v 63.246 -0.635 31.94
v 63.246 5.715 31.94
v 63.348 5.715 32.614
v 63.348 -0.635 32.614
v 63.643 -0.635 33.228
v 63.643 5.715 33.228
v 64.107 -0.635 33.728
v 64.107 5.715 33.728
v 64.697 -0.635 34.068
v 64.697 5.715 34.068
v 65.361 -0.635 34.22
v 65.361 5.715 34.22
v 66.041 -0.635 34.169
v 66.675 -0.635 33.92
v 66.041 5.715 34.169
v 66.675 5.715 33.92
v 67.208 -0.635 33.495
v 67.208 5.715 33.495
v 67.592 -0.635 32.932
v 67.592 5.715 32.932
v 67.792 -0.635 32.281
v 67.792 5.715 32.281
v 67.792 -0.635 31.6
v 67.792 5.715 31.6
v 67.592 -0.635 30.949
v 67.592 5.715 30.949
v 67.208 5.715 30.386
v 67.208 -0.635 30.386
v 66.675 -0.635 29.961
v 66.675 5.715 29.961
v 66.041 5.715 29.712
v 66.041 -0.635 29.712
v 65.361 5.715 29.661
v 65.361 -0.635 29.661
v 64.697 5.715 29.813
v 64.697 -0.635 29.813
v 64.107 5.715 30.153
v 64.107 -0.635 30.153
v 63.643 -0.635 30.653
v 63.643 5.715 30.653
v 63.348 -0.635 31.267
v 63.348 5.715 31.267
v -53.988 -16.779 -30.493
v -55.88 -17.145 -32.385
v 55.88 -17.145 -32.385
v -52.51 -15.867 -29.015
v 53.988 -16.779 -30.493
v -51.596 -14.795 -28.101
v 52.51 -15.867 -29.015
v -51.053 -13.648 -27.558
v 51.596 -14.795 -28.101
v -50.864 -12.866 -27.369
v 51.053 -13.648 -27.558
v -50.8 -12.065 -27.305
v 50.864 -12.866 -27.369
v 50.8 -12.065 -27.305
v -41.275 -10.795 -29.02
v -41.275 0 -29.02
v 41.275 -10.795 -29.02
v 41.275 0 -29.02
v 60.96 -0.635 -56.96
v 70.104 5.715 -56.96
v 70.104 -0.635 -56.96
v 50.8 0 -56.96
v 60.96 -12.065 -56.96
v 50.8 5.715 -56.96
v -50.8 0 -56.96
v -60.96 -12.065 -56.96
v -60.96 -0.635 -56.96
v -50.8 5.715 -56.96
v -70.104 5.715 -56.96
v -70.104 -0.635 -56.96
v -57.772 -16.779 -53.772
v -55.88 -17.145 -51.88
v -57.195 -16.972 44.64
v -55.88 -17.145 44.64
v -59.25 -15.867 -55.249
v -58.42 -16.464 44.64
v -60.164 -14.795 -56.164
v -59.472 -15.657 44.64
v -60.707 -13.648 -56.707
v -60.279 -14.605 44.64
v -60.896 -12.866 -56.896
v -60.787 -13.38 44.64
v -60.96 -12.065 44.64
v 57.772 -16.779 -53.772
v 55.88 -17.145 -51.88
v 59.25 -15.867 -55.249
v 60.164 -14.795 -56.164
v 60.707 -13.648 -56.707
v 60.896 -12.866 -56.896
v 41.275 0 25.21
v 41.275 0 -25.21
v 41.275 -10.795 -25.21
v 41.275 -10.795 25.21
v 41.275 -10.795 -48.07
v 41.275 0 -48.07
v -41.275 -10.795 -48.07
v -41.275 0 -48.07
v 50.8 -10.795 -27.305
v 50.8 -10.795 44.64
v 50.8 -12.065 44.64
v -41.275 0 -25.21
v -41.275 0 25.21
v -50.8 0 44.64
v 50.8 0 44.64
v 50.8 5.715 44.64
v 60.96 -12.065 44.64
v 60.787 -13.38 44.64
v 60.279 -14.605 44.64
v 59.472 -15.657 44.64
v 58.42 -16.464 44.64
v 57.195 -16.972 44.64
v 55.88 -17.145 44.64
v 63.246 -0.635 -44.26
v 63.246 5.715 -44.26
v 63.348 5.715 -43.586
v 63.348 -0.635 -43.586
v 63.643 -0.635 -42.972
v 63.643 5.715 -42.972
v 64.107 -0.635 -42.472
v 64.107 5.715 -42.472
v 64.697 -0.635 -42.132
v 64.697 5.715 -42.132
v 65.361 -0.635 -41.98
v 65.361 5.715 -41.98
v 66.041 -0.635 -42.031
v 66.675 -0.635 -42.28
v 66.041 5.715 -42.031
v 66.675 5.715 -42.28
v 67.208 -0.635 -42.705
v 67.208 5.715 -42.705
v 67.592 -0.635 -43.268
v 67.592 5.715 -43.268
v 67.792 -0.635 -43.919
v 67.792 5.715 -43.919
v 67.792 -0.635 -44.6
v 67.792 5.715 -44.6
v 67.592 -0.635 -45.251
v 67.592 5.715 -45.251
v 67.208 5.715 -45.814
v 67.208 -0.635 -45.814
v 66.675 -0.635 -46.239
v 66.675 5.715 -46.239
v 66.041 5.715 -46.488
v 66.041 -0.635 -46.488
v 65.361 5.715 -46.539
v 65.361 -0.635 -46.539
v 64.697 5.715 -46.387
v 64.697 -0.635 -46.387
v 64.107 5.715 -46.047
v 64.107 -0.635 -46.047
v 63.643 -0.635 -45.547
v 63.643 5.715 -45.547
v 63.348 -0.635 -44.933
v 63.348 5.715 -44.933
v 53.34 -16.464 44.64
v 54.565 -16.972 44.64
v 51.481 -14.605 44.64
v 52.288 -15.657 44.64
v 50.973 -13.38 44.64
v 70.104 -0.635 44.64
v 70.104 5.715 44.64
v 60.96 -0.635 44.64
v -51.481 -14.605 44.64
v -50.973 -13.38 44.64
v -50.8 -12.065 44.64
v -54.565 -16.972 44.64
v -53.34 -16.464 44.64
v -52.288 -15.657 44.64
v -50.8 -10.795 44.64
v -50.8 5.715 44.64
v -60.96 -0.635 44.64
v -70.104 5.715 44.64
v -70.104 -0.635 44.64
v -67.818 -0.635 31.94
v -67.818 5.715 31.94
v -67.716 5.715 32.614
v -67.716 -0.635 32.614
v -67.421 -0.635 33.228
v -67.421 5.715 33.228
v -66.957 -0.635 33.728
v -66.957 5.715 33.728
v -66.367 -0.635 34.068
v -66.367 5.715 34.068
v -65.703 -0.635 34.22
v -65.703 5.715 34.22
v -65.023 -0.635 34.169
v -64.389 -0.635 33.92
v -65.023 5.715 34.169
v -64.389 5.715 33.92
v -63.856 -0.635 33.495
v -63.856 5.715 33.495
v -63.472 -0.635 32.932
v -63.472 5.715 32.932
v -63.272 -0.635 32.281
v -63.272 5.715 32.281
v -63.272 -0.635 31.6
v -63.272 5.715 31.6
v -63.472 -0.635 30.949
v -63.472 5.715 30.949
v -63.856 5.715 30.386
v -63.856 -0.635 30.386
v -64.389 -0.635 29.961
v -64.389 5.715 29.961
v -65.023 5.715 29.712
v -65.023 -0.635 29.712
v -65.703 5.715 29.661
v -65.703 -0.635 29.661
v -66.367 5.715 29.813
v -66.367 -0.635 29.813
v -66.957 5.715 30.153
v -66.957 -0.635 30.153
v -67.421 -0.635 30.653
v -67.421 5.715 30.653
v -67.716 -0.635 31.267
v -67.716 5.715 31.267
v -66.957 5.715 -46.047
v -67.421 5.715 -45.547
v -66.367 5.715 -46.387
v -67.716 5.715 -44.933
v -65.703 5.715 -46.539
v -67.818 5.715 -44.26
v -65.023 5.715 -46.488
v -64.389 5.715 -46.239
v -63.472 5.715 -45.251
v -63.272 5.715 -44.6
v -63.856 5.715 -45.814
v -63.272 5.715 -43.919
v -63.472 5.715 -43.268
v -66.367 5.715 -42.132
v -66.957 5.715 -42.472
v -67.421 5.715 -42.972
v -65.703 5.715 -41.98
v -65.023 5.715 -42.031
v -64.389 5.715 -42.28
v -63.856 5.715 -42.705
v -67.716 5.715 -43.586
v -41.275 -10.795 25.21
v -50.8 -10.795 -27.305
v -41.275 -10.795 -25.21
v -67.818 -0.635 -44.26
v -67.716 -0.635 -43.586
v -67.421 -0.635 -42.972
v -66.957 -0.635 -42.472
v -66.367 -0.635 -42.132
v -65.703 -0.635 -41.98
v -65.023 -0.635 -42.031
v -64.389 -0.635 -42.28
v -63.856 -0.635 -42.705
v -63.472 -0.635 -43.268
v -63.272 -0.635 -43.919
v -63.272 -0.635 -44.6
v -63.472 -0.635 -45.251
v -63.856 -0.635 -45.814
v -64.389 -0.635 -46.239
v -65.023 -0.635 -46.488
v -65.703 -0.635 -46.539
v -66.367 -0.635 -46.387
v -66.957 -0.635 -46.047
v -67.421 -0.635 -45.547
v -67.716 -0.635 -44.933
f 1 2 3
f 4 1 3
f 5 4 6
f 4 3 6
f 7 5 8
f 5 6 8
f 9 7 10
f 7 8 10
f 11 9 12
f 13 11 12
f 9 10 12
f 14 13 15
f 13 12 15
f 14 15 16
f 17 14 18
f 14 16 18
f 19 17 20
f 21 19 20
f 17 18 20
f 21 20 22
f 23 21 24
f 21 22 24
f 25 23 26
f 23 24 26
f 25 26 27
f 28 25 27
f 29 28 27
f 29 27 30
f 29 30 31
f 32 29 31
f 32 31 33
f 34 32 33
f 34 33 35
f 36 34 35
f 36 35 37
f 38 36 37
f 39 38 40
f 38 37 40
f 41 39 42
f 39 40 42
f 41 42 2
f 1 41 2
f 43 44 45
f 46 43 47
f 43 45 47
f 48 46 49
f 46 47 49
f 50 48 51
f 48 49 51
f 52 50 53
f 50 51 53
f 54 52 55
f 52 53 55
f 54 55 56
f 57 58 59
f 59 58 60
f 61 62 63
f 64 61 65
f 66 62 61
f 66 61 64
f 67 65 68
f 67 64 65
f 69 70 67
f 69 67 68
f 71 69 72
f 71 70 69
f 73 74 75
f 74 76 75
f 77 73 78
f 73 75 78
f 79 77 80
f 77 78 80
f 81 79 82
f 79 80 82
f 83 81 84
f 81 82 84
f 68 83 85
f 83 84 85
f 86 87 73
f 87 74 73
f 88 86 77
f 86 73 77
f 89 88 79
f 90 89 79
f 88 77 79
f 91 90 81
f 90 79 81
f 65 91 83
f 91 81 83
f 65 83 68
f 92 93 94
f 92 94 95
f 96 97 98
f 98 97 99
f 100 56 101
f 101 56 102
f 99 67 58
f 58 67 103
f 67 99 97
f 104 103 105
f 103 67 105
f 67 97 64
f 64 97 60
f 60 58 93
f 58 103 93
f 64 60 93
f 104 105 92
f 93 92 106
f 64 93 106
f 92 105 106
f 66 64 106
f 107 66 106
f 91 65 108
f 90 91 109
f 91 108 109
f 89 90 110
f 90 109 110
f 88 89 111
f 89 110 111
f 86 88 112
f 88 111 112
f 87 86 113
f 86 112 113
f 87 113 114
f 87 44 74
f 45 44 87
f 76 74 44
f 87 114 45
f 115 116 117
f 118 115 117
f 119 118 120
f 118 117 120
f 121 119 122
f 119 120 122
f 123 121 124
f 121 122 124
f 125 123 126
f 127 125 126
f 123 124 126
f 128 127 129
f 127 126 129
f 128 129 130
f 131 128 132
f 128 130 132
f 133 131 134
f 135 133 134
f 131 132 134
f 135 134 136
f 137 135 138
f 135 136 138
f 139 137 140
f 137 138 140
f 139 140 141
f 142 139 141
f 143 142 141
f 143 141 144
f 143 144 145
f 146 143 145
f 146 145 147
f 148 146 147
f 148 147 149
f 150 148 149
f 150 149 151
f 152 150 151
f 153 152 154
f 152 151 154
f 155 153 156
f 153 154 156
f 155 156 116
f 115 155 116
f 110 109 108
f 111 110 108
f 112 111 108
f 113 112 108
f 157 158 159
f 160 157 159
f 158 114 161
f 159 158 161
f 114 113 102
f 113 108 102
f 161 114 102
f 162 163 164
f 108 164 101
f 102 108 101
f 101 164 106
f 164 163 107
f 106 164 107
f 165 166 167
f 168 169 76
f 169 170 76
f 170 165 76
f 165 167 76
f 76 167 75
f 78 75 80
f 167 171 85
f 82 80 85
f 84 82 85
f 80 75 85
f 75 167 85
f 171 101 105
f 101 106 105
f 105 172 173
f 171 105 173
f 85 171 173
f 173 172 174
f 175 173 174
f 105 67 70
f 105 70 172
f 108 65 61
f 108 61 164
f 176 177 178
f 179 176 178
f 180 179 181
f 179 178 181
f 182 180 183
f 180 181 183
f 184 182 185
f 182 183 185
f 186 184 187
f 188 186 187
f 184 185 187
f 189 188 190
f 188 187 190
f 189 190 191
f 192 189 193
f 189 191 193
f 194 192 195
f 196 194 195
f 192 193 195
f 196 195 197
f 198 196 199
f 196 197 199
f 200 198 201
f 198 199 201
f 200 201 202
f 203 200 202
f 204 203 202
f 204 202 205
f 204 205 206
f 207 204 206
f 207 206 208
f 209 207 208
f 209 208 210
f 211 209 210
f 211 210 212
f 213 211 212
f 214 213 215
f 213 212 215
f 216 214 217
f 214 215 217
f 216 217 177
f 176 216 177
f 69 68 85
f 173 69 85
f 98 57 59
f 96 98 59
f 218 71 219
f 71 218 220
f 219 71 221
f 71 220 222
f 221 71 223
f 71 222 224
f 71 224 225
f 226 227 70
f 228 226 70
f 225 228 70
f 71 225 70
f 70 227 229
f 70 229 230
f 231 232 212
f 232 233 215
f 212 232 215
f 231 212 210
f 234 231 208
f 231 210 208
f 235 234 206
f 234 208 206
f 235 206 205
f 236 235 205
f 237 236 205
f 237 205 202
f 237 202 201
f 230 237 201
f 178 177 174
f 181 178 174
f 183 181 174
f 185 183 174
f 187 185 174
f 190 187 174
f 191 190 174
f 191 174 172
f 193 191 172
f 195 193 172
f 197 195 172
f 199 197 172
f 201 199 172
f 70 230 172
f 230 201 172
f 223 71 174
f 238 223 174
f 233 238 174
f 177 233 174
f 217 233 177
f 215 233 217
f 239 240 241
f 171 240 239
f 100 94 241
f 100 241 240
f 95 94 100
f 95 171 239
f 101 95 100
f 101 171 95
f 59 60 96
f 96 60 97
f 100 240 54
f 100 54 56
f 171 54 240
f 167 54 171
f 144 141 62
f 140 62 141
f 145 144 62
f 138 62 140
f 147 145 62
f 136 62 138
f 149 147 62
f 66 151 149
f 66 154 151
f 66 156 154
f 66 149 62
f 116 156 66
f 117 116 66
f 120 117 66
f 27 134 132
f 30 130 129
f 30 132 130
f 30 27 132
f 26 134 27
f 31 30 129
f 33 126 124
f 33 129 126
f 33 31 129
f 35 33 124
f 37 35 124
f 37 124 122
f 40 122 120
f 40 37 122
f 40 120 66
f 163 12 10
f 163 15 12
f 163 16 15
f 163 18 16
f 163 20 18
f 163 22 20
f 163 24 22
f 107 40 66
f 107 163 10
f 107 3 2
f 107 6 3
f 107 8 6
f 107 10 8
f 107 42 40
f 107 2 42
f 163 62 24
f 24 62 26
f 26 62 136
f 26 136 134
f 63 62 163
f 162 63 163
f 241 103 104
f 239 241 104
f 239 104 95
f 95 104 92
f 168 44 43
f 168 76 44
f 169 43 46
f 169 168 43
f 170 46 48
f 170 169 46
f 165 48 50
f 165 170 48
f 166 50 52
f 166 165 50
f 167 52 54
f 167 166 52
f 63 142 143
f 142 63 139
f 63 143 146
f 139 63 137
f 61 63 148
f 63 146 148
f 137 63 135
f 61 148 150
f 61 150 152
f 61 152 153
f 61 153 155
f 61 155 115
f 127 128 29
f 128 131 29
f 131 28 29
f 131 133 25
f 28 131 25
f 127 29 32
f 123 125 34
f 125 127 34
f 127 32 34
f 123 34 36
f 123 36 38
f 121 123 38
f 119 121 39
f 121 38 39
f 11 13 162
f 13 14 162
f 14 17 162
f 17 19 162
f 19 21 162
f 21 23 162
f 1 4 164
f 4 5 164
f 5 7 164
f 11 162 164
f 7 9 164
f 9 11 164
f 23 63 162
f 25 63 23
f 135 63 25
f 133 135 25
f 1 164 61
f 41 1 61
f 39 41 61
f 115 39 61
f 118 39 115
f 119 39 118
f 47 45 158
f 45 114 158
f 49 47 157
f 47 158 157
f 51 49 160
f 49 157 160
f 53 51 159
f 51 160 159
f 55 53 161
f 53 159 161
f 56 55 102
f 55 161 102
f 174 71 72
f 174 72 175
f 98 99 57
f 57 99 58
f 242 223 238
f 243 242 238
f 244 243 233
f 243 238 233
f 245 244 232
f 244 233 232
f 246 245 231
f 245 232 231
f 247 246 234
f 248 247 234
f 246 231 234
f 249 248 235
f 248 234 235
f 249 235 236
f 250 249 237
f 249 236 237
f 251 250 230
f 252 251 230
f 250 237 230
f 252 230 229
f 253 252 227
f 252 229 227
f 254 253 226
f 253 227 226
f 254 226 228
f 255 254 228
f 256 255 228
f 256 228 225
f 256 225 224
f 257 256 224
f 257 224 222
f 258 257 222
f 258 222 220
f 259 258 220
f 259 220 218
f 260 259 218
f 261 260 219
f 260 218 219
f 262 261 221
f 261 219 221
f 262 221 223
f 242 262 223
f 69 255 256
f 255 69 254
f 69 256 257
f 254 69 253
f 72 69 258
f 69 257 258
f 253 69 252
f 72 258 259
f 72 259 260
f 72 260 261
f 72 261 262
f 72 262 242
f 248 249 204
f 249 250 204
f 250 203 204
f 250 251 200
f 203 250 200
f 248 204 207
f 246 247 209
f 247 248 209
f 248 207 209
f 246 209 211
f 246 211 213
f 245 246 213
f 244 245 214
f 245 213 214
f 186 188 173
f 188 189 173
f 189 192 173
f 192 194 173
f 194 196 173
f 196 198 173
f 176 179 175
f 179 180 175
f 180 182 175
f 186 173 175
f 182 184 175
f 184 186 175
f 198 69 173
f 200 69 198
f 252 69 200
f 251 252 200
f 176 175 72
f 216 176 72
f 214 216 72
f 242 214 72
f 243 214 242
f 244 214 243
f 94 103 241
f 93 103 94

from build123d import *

# Parameters (mm, degrees)
F0_W     = 101.6
F0_H     = 101.6
F0_W_2   = 82.55
F0_H_2   = 50.419
F1_DEPTH = 10.795
F2_W     = 101.6
F2_H     = 29.6545
F2_W_2   = 82.55
F2_H_2   = 19.05
F3_DEPTH = 6.35
F4_W     = 10.16
F4_H     = 101.6
F5_DEPTH = 22.86
F6_W     = 9.144
F6_H     = 101.6
F6_R     = 2.286
F7_DEPTH = 6.35
F8_R     = 5.08
F9_R     = 5.07999


# Not quite as in the source:
# - a fillet or chamfer is up to 0.001 mm smaller than in the source, because OpenCascade refuses the exact size


with BuildPart() as f1:
    # F0 (on Front) → F1 (new body)
    with BuildSketch(Plane.XZ):
        with Locations((0, -6.1595)):
            Rectangle(F0_W, F0_H)
        Polygon((-41.275, -29.0195), (0, -29.0195), (41.275, -29.0195), (41.275, -48.0695), (-41.275, -48.0695), align=None, mode=Mode.SUBTRACT)
        Rectangle(F0_W_2, F0_H_2, mode=Mode.SUBTRACT)
    extrude(amount=F1_DEPTH)

    # F2 (on face) → F3 (join)
    with BuildSketch(Plane.XZ.offset(10.795)):
        with Locations((0, -42.13225)):
            Rectangle(F2_W, F2_H)
        with Locations((0, -38.5445)):
            Rectangle(F2_W_2, F2_H_2, mode=Mode.SUBTRACT)
        with Locations((0, -38.5445)):
            Rectangle(F2_W_2, F2_H_2)
    extrude(amount=F3_DEPTH)

    # F4 (on face) → F5 (join)
    with BuildSketch(Plane.XZ.offset(17.145)):
        with Locations((-55.88, -6.1595)):
            Rectangle(F4_W, F4_H)
        with Locations((55.88, -6.1595)):
            Rectangle(F4_W, F4_H)
    extrude(amount=-F5_DEPTH)

    # F6 (on face) → F7 (join)
    with BuildSketch(Plane(origin=(0, 5.715, 0), x_dir=(-1, 0, 0), z_dir=(0, 1, 0))):
        with Locations((-65.532, -6.1595)):
            Rectangle(F6_W, F6_H)
        with Locations((-65.532, -44.2595)):
            Circle(F6_R, mode=Mode.SUBTRACT)
        with Locations((-65.532, 31.9405)):
            Circle(F6_R, mode=Mode.SUBTRACT)
        with Locations((65.532, -6.1595)):
            Rectangle(F6_W, F6_H)
        with Locations((65.532, -44.2595)):
            Circle(F6_R, mode=Mode.SUBTRACT)
        with Locations((65.532, 31.9405)):
            Circle(F6_R, mode=Mode.SUBTRACT)
    extrude(amount=-F7_DEPTH)

    # F8
    f8_edges = [f1.edges().sort_by_distance(p)[0] for p in [
        (-60.96, -17.145, -6.1595),
        (0, -17.145, -56.9595),
        (60.96, -17.145, -6.1595),
    ]]
    fillet(f8_edges, radius=F8_R)

    # F9 (radius 5.08 in the source; OpenCascade refuses exactly that, so slightly less here)
    f9_edges = [f1.edges().sort_by_distance(p)[0] for p in [
        (-50.8, -17.145, 8.66775),
        (0, -17.145, -27.305),
        (50.8, -17.145, 8.66775),
    ]]
    fillet(f9_edges, radius=F9_R)


solid = f1.part
